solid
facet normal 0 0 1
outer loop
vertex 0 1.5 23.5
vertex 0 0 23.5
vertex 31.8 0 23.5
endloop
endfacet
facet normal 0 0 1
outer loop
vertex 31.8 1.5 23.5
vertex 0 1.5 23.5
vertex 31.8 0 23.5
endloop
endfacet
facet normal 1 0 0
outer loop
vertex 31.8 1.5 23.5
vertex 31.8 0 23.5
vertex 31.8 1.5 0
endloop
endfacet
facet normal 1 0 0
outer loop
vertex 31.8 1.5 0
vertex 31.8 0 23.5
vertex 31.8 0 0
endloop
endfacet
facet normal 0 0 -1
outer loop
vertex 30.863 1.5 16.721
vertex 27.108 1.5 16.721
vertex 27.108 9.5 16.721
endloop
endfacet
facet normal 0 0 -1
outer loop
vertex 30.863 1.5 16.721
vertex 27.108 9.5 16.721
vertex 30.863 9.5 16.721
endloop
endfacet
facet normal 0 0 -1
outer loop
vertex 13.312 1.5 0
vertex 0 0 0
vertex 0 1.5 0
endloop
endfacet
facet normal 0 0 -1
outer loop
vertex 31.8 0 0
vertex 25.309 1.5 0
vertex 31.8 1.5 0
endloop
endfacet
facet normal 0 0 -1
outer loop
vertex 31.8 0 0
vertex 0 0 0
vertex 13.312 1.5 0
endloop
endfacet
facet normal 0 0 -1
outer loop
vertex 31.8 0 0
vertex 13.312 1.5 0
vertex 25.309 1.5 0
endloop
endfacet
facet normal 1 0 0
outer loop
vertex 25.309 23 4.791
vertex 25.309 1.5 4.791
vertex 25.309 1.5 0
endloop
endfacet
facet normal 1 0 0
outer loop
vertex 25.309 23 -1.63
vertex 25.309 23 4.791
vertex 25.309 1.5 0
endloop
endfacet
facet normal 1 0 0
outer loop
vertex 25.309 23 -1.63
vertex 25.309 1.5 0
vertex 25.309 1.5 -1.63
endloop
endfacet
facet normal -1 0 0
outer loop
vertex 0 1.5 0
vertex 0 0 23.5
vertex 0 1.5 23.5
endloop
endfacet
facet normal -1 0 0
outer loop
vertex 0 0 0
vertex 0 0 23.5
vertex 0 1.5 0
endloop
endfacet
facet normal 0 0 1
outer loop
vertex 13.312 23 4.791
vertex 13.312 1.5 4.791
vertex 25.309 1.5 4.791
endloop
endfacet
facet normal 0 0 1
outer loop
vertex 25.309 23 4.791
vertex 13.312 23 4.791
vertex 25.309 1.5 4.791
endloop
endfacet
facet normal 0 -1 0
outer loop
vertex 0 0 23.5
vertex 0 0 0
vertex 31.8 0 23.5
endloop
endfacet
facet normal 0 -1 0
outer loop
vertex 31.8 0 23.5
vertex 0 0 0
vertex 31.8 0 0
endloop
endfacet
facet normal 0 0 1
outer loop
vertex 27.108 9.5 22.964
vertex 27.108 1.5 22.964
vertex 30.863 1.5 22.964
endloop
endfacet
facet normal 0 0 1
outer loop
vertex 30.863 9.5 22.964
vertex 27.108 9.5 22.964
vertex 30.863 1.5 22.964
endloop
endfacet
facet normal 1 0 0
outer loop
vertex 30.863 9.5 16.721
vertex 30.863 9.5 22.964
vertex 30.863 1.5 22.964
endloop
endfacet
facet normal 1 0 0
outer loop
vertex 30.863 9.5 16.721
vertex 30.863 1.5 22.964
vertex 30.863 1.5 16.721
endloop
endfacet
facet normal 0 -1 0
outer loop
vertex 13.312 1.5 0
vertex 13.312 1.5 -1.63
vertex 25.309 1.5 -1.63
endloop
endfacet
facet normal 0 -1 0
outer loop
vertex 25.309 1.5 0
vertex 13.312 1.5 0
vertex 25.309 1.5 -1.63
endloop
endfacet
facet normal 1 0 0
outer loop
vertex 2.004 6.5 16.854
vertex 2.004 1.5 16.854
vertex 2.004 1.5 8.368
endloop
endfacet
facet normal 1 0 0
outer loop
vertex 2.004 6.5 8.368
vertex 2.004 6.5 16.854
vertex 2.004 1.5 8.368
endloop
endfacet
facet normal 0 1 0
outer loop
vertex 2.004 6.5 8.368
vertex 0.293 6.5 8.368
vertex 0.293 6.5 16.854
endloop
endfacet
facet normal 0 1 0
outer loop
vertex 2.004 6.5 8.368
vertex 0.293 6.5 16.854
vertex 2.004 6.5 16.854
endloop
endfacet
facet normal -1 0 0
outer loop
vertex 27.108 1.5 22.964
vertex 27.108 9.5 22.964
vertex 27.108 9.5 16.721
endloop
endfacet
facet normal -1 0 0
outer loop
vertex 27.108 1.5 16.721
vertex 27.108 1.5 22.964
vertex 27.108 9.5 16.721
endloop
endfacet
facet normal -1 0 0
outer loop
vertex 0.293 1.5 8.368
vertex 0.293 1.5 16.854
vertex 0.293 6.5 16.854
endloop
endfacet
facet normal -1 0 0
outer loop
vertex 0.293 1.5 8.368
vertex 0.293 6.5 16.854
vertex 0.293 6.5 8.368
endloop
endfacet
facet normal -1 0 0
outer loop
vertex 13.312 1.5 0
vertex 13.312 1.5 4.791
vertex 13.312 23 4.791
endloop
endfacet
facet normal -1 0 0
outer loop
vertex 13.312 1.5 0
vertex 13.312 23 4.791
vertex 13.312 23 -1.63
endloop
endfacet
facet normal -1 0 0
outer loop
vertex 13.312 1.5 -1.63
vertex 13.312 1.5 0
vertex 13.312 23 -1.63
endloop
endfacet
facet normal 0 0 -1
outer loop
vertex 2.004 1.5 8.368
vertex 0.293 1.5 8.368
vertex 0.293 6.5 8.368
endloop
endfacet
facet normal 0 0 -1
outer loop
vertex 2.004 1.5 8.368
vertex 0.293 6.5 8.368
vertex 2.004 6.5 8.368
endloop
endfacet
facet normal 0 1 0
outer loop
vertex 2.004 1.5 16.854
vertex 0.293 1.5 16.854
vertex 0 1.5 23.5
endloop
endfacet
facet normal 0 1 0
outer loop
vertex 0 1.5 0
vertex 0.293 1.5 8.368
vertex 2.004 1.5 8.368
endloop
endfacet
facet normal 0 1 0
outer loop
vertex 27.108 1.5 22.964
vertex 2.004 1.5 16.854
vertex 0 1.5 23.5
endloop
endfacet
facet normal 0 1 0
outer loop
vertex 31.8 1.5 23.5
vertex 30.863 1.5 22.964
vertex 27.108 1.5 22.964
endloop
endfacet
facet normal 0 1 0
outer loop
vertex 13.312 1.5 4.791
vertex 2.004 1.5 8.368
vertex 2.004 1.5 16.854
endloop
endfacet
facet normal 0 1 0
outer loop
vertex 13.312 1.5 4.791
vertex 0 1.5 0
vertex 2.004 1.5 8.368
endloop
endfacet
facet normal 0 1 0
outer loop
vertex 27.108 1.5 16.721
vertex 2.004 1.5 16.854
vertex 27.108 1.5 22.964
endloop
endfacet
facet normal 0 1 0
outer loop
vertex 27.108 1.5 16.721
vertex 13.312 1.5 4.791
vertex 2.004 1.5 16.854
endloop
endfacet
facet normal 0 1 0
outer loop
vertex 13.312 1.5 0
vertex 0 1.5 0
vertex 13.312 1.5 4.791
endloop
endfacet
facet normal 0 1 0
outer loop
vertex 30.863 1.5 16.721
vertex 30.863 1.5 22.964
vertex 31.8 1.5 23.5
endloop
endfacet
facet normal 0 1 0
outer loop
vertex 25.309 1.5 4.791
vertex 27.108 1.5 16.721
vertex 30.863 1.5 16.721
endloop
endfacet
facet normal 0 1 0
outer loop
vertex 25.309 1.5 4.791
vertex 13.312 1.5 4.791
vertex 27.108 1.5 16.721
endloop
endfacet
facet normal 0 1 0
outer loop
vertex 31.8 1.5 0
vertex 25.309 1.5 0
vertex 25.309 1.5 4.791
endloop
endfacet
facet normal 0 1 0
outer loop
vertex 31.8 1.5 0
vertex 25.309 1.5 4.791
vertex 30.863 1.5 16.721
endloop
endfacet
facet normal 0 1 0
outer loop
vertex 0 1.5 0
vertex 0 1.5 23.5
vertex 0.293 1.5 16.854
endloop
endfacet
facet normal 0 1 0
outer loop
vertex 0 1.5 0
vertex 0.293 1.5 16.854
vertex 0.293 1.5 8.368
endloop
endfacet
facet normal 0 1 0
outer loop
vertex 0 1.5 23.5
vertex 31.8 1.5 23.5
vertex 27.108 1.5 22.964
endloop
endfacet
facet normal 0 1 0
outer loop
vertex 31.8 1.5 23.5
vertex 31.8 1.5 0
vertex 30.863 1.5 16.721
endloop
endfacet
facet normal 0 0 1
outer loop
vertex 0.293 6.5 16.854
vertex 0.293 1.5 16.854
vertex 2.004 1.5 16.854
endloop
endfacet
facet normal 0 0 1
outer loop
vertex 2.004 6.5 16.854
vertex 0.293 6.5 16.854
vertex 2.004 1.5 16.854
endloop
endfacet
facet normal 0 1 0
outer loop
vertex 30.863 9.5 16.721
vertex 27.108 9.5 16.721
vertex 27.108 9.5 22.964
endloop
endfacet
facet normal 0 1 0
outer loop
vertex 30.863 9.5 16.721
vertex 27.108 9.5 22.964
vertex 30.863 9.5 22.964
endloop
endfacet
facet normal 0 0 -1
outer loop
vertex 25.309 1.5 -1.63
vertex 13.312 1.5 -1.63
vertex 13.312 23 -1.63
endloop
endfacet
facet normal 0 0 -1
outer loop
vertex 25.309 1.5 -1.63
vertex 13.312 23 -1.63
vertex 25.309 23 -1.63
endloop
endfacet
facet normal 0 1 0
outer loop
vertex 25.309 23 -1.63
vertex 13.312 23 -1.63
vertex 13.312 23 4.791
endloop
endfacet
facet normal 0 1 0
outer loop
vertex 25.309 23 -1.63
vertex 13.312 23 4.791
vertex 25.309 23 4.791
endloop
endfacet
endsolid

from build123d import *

# Parameters (mm, degrees)
SKETCH1_W           = 31.8
SKETCH1_H           = 23.5
BOSS_EXTRUDE1_DEPTH = 1.5
SKETCH2_W           = 1.710657602
SKETCH2_H           = 8.486639013
BOSS_EXTRUDE2_DEPTH = 5
SKETCH3_W           = 3.754560192
SKETCH3_H           = 6.242789431
BOSS_EXTRUDE3_DEPTH = 8
SKETCH4_W           = 11.996819547
SKETCH4_H           = 6.420520091
BOSS_EXTRUDE4_DEPTH = 21.5


with BuildPart() as part:
    # Sketch1 → Boss-Extrude1 (new body)
    with BuildSketch(Plane(origin=(0, 0, 0), x_dir=(1, 0, 0), z_dir=(0, 1, 0))):
        with Locations((15.9, -11.75)):
            Rectangle(SKETCH1_W, SKETCH1_H)
    extrude(amount=BOSS_EXTRUDE1_DEPTH)

    # Sketch2 → Boss-Extrude2 (add)
    with BuildSketch(Plane(origin=(0, 1.5, 0), x_dir=(1, 0, 0), z_dir=(0, 1, 0))):
        with Locations((1.148381727, -12.610949144)):
            Rectangle(SKETCH2_W, SKETCH2_H)
    extrude(amount=BOSS_EXTRUDE2_DEPTH)

    # Sketch3 → Boss-Extrude3 (add)
    with BuildSketch(Plane(origin=(0, 1.5, 0), x_dir=(1, 0, 0), z_dir=(0, 1, 0))):
        with Locations((28.985446343, -19.842365371)):
            Rectangle(SKETCH3_W, SKETCH3_H)
    extrude(amount=BOSS_EXTRUDE3_DEPTH)

    # Sketch4 → Boss-Extrude4 (add)
    with BuildSketch(Plane(origin=(0, 1.5, 0), x_dir=(1, 0, 0), z_dir=(0, 1, 0))):
        with Locations((19.310233542, -1.58054006)):
            Rectangle(SKETCH4_W, SKETCH4_H)
    extrude(amount=BOSS_EXTRUDE4_DEPTH)


solid = part.part
